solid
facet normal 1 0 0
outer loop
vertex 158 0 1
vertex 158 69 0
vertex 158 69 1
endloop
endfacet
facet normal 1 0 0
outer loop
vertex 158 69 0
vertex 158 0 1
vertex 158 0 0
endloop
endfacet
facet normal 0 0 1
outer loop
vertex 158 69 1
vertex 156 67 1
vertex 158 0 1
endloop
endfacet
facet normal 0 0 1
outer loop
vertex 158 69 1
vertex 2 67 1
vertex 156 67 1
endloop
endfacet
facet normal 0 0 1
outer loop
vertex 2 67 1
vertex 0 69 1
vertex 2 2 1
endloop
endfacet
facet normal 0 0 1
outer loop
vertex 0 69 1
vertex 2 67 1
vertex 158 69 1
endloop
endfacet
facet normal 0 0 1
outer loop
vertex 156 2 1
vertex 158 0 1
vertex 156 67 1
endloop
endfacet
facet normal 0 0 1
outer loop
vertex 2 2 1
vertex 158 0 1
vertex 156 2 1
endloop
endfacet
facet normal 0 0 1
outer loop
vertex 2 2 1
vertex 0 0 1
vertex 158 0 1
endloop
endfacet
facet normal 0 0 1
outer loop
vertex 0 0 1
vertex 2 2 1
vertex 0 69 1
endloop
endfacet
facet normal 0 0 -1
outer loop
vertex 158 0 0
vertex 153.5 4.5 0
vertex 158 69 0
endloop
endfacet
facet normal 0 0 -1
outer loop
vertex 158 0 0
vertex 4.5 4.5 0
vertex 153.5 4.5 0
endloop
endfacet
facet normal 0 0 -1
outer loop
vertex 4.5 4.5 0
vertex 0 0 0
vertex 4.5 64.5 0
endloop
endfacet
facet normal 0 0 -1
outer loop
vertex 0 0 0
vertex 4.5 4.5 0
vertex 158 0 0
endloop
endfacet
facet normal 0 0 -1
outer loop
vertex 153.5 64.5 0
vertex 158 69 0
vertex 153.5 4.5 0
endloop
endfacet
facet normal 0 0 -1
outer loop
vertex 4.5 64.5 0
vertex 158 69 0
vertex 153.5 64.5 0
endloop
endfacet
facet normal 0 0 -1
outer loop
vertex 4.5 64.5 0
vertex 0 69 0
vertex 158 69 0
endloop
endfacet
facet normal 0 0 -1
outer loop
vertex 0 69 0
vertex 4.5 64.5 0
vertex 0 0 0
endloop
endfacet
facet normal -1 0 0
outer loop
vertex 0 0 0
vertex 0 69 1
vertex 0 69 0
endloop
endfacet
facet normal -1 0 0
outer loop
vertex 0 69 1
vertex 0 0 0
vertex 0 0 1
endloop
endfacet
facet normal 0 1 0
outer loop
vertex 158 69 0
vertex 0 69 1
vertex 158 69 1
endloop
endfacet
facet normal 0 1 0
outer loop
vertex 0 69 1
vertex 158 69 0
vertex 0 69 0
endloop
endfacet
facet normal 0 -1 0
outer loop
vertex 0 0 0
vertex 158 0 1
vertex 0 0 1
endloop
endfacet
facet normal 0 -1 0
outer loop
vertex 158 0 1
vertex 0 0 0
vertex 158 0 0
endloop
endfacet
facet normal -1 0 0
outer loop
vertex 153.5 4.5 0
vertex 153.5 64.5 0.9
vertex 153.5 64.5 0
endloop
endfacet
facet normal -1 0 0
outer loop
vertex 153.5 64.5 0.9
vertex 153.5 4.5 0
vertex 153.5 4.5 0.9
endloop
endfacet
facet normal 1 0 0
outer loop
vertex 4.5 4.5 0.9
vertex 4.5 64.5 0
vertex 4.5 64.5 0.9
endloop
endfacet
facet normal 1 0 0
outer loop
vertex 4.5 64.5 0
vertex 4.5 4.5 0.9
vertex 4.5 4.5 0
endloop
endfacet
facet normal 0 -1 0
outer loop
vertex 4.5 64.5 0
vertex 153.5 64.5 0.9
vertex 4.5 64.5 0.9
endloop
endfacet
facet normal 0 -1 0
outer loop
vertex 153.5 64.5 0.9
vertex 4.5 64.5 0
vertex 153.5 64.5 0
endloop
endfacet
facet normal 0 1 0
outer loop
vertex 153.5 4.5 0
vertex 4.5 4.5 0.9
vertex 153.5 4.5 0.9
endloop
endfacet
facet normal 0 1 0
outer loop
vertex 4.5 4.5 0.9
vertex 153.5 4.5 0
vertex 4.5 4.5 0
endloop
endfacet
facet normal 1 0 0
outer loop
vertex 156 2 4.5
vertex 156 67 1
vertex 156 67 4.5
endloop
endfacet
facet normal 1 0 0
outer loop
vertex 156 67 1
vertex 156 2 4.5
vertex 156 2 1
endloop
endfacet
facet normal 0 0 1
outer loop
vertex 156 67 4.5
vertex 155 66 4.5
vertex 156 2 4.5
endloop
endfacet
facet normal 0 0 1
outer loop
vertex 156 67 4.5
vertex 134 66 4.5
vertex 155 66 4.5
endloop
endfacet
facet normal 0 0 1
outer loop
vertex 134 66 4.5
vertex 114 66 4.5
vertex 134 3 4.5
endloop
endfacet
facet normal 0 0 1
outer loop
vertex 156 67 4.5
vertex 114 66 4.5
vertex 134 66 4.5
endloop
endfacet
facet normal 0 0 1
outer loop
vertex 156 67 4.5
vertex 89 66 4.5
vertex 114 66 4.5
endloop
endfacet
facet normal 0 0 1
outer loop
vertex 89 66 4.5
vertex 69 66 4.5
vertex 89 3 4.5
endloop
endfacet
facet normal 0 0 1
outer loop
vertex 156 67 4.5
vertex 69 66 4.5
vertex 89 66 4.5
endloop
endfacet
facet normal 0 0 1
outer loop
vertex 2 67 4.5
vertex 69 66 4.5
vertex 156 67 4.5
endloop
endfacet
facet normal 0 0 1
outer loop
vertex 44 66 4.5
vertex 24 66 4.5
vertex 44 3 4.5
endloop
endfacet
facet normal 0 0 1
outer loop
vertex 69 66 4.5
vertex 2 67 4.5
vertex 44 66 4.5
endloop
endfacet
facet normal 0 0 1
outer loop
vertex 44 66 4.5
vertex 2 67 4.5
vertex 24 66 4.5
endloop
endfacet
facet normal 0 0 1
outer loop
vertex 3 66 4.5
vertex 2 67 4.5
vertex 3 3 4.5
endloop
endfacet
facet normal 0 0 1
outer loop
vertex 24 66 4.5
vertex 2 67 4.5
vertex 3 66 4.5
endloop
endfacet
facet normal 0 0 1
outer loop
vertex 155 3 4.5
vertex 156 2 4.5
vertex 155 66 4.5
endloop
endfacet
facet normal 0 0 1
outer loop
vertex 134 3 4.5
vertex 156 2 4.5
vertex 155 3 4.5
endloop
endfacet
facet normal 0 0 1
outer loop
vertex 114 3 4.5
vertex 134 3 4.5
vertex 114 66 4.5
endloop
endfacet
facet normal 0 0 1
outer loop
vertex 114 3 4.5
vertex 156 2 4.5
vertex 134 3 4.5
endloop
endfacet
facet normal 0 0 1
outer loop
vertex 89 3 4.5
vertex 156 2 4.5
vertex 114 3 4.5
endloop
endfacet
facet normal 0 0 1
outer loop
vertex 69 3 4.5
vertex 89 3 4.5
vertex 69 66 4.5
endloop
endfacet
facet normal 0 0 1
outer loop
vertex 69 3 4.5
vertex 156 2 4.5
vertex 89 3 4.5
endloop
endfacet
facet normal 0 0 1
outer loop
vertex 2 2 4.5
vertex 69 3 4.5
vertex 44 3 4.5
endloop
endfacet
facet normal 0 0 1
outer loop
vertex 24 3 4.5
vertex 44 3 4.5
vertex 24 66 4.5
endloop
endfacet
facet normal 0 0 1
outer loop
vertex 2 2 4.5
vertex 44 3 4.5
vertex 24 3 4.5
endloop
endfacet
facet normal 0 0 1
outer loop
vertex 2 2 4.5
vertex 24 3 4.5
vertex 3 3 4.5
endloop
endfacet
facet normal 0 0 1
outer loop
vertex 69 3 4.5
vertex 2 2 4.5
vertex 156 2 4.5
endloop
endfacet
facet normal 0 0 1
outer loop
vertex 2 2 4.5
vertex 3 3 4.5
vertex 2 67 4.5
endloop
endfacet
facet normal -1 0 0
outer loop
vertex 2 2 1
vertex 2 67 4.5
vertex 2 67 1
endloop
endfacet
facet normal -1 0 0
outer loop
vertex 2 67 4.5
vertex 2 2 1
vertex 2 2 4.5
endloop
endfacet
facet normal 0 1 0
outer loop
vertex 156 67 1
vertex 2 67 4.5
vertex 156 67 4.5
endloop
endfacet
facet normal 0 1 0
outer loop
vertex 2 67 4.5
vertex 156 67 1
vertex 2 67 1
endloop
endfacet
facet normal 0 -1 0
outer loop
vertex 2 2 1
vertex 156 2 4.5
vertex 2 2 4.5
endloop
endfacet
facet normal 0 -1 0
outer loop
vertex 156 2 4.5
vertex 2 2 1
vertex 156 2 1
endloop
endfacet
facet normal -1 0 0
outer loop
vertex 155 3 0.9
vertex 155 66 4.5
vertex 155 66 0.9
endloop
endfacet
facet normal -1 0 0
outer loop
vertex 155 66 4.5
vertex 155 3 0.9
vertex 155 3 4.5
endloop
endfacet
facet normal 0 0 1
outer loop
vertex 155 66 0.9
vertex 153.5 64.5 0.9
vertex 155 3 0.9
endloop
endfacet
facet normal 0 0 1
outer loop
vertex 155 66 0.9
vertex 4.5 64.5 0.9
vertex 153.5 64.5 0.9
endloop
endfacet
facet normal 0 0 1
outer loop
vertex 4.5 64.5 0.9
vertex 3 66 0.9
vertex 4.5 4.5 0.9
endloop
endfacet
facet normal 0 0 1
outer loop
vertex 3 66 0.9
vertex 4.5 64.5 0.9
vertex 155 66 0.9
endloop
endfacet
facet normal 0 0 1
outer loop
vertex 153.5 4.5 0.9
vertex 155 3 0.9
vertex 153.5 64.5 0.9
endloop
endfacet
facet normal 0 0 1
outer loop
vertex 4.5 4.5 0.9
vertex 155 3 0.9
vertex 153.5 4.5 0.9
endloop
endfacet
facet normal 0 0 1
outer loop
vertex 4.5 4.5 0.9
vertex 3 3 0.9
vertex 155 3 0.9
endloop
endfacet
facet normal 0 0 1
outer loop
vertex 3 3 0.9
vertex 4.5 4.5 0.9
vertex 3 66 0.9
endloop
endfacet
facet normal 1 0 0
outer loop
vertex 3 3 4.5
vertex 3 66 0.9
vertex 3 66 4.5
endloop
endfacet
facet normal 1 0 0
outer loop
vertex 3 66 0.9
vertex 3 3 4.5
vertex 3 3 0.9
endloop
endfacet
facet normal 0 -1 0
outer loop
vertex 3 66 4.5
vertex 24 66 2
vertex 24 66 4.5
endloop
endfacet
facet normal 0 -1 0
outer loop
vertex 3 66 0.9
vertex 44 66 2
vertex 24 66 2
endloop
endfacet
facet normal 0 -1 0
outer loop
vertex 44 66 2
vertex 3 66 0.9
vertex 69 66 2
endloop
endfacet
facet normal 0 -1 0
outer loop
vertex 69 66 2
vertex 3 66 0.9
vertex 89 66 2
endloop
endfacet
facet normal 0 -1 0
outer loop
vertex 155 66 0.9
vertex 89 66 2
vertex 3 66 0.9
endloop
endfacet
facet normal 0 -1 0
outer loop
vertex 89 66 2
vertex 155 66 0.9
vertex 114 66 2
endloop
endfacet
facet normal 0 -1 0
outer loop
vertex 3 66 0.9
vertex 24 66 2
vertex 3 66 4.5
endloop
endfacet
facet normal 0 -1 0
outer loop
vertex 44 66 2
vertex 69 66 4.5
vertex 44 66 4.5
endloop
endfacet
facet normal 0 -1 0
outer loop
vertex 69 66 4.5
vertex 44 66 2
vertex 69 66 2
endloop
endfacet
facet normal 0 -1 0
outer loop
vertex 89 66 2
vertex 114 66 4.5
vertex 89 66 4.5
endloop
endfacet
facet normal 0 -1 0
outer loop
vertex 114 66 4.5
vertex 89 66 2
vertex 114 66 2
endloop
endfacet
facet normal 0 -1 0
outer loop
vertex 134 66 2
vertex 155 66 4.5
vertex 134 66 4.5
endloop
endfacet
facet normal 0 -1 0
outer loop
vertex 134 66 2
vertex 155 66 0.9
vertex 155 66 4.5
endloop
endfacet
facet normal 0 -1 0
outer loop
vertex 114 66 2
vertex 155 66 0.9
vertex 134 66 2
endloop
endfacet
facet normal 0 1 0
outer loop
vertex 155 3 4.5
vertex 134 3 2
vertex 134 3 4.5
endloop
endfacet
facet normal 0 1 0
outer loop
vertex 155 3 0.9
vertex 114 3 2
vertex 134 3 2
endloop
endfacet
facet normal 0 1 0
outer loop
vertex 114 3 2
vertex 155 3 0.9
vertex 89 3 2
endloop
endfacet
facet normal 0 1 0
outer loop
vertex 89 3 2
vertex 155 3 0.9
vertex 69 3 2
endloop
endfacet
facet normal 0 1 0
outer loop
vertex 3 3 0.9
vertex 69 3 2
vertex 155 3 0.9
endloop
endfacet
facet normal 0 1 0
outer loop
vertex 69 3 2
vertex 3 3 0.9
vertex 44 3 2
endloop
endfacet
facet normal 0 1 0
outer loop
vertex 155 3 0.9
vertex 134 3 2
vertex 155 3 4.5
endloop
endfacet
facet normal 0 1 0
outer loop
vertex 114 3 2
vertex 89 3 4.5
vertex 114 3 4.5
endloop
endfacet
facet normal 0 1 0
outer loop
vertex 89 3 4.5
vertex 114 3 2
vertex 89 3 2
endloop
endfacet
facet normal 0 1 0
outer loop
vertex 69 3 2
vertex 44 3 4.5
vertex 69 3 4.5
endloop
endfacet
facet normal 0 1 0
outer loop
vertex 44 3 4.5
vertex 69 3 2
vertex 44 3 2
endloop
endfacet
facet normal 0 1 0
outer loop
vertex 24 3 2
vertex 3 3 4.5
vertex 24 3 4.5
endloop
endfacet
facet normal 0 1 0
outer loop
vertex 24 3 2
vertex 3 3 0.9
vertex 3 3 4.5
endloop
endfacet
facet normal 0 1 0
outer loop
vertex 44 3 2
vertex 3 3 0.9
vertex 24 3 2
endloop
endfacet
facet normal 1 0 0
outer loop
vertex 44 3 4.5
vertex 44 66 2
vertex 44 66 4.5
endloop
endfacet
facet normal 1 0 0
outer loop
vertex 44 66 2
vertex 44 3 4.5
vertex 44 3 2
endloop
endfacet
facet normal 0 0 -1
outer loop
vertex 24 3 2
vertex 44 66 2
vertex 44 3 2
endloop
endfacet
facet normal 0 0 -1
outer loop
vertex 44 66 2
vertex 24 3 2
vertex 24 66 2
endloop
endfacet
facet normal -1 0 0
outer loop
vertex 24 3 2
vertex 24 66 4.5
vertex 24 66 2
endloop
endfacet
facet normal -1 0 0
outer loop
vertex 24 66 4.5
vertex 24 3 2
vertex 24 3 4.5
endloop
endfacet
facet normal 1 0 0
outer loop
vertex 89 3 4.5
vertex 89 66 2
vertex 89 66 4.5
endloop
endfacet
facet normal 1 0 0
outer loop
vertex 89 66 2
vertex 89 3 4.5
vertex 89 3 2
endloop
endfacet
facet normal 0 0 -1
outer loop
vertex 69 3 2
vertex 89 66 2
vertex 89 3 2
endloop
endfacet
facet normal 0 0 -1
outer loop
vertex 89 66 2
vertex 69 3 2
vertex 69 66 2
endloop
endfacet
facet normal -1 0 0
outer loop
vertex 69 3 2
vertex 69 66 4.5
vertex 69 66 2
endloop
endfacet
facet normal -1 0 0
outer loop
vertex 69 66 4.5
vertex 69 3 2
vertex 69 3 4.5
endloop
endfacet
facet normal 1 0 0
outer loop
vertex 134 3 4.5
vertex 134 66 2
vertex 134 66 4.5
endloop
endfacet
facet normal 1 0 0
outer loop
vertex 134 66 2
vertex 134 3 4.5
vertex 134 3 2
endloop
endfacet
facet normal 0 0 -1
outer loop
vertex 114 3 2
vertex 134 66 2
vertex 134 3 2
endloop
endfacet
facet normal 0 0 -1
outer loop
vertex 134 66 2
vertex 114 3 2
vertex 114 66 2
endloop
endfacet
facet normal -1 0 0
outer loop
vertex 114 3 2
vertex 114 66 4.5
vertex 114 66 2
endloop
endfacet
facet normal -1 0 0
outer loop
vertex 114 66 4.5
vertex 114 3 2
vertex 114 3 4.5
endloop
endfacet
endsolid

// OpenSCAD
// Pocket dimensions from sign_base.scad
pocket_width = 154; // Long side (horizontal)
pocket_height = 65; // Short side (vertical)

// Box dimensions
box_width = 2 + 154 + 2; // 158mm
box_height = 2 + 65 + 2; // 69mm
box_thickness = 1.0; // 1mm

epsilon = 0.1;

// Cutout dimensions
cutout_width = 154 - 2 - 1 - 2; // 149mm
cutout_height = 65 - 2 - 1 - 2; // 60mm

// Bar on top
bar_width = 154;
bar_height = 65;
bar_thickness = 3.5;

// Inner cutout dimensions
inner_cutout_width = 154 - 1 - 1; // 152mm
inner_cutout_height = 65 - 1 - 1; // 63mm

// Card holder boxes
holder_width = 65;
holder_height = 20;
holder_thickness = 2.5;

module sign_frame() {
    union() {
        difference() {
            union() {
                difference() {
                    // Simple box
                    cube([box_width, box_height, box_thickness]);
                    
                    // Cut out box (centered)
                    translate([(box_width - cutout_width) / 2, (box_height - cutout_height) / 2, -epsilon])
                        cube([cutout_width, cutout_height, box_thickness + 2*epsilon]);
                }
                
                // Bar on top (154x65mm, centered)
                translate([(box_width - bar_width) / 2, (box_height - bar_height) / 2, box_thickness])
                    cube([bar_width, bar_height, bar_thickness]);
            }
            
            // Cut out from the bar (centered)
            translate([(box_width - inner_cutout_width) / 2, (box_height - inner_cutout_height) / 2, box_thickness - epsilon])
                cube([inner_cutout_width, inner_cutout_height, bar_thickness + 2*epsilon]);
        }
        
        // Left holder (20mm wide x 65mm high, 45mm left of center)
        translate([(box_width - holder_height) / 2 - 45, (box_height - holder_width) / 2, box_thickness + bar_thickness - holder_thickness])
            cube([holder_height, holder_width, holder_thickness]);
        
        // Center holder (20mm wide x 65mm high, centered)
        translate([(box_width - holder_height) / 2, (box_height - holder_width) / 2, box_thickness + bar_thickness - holder_thickness])
            cube([holder_height, holder_width, holder_thickness]);
        
        // Right holder (20mm wide x 65mm high, 45mm right of center)
        translate([(box_width - holder_height) / 2 + 45, (box_height - holder_width) / 2, box_thickness + bar_thickness - holder_thickness])
            cube([holder_height, holder_width, holder_thickness]);
    }
}

// Render settings
$fn = 40;

// Generate the frame
sign_frame();
